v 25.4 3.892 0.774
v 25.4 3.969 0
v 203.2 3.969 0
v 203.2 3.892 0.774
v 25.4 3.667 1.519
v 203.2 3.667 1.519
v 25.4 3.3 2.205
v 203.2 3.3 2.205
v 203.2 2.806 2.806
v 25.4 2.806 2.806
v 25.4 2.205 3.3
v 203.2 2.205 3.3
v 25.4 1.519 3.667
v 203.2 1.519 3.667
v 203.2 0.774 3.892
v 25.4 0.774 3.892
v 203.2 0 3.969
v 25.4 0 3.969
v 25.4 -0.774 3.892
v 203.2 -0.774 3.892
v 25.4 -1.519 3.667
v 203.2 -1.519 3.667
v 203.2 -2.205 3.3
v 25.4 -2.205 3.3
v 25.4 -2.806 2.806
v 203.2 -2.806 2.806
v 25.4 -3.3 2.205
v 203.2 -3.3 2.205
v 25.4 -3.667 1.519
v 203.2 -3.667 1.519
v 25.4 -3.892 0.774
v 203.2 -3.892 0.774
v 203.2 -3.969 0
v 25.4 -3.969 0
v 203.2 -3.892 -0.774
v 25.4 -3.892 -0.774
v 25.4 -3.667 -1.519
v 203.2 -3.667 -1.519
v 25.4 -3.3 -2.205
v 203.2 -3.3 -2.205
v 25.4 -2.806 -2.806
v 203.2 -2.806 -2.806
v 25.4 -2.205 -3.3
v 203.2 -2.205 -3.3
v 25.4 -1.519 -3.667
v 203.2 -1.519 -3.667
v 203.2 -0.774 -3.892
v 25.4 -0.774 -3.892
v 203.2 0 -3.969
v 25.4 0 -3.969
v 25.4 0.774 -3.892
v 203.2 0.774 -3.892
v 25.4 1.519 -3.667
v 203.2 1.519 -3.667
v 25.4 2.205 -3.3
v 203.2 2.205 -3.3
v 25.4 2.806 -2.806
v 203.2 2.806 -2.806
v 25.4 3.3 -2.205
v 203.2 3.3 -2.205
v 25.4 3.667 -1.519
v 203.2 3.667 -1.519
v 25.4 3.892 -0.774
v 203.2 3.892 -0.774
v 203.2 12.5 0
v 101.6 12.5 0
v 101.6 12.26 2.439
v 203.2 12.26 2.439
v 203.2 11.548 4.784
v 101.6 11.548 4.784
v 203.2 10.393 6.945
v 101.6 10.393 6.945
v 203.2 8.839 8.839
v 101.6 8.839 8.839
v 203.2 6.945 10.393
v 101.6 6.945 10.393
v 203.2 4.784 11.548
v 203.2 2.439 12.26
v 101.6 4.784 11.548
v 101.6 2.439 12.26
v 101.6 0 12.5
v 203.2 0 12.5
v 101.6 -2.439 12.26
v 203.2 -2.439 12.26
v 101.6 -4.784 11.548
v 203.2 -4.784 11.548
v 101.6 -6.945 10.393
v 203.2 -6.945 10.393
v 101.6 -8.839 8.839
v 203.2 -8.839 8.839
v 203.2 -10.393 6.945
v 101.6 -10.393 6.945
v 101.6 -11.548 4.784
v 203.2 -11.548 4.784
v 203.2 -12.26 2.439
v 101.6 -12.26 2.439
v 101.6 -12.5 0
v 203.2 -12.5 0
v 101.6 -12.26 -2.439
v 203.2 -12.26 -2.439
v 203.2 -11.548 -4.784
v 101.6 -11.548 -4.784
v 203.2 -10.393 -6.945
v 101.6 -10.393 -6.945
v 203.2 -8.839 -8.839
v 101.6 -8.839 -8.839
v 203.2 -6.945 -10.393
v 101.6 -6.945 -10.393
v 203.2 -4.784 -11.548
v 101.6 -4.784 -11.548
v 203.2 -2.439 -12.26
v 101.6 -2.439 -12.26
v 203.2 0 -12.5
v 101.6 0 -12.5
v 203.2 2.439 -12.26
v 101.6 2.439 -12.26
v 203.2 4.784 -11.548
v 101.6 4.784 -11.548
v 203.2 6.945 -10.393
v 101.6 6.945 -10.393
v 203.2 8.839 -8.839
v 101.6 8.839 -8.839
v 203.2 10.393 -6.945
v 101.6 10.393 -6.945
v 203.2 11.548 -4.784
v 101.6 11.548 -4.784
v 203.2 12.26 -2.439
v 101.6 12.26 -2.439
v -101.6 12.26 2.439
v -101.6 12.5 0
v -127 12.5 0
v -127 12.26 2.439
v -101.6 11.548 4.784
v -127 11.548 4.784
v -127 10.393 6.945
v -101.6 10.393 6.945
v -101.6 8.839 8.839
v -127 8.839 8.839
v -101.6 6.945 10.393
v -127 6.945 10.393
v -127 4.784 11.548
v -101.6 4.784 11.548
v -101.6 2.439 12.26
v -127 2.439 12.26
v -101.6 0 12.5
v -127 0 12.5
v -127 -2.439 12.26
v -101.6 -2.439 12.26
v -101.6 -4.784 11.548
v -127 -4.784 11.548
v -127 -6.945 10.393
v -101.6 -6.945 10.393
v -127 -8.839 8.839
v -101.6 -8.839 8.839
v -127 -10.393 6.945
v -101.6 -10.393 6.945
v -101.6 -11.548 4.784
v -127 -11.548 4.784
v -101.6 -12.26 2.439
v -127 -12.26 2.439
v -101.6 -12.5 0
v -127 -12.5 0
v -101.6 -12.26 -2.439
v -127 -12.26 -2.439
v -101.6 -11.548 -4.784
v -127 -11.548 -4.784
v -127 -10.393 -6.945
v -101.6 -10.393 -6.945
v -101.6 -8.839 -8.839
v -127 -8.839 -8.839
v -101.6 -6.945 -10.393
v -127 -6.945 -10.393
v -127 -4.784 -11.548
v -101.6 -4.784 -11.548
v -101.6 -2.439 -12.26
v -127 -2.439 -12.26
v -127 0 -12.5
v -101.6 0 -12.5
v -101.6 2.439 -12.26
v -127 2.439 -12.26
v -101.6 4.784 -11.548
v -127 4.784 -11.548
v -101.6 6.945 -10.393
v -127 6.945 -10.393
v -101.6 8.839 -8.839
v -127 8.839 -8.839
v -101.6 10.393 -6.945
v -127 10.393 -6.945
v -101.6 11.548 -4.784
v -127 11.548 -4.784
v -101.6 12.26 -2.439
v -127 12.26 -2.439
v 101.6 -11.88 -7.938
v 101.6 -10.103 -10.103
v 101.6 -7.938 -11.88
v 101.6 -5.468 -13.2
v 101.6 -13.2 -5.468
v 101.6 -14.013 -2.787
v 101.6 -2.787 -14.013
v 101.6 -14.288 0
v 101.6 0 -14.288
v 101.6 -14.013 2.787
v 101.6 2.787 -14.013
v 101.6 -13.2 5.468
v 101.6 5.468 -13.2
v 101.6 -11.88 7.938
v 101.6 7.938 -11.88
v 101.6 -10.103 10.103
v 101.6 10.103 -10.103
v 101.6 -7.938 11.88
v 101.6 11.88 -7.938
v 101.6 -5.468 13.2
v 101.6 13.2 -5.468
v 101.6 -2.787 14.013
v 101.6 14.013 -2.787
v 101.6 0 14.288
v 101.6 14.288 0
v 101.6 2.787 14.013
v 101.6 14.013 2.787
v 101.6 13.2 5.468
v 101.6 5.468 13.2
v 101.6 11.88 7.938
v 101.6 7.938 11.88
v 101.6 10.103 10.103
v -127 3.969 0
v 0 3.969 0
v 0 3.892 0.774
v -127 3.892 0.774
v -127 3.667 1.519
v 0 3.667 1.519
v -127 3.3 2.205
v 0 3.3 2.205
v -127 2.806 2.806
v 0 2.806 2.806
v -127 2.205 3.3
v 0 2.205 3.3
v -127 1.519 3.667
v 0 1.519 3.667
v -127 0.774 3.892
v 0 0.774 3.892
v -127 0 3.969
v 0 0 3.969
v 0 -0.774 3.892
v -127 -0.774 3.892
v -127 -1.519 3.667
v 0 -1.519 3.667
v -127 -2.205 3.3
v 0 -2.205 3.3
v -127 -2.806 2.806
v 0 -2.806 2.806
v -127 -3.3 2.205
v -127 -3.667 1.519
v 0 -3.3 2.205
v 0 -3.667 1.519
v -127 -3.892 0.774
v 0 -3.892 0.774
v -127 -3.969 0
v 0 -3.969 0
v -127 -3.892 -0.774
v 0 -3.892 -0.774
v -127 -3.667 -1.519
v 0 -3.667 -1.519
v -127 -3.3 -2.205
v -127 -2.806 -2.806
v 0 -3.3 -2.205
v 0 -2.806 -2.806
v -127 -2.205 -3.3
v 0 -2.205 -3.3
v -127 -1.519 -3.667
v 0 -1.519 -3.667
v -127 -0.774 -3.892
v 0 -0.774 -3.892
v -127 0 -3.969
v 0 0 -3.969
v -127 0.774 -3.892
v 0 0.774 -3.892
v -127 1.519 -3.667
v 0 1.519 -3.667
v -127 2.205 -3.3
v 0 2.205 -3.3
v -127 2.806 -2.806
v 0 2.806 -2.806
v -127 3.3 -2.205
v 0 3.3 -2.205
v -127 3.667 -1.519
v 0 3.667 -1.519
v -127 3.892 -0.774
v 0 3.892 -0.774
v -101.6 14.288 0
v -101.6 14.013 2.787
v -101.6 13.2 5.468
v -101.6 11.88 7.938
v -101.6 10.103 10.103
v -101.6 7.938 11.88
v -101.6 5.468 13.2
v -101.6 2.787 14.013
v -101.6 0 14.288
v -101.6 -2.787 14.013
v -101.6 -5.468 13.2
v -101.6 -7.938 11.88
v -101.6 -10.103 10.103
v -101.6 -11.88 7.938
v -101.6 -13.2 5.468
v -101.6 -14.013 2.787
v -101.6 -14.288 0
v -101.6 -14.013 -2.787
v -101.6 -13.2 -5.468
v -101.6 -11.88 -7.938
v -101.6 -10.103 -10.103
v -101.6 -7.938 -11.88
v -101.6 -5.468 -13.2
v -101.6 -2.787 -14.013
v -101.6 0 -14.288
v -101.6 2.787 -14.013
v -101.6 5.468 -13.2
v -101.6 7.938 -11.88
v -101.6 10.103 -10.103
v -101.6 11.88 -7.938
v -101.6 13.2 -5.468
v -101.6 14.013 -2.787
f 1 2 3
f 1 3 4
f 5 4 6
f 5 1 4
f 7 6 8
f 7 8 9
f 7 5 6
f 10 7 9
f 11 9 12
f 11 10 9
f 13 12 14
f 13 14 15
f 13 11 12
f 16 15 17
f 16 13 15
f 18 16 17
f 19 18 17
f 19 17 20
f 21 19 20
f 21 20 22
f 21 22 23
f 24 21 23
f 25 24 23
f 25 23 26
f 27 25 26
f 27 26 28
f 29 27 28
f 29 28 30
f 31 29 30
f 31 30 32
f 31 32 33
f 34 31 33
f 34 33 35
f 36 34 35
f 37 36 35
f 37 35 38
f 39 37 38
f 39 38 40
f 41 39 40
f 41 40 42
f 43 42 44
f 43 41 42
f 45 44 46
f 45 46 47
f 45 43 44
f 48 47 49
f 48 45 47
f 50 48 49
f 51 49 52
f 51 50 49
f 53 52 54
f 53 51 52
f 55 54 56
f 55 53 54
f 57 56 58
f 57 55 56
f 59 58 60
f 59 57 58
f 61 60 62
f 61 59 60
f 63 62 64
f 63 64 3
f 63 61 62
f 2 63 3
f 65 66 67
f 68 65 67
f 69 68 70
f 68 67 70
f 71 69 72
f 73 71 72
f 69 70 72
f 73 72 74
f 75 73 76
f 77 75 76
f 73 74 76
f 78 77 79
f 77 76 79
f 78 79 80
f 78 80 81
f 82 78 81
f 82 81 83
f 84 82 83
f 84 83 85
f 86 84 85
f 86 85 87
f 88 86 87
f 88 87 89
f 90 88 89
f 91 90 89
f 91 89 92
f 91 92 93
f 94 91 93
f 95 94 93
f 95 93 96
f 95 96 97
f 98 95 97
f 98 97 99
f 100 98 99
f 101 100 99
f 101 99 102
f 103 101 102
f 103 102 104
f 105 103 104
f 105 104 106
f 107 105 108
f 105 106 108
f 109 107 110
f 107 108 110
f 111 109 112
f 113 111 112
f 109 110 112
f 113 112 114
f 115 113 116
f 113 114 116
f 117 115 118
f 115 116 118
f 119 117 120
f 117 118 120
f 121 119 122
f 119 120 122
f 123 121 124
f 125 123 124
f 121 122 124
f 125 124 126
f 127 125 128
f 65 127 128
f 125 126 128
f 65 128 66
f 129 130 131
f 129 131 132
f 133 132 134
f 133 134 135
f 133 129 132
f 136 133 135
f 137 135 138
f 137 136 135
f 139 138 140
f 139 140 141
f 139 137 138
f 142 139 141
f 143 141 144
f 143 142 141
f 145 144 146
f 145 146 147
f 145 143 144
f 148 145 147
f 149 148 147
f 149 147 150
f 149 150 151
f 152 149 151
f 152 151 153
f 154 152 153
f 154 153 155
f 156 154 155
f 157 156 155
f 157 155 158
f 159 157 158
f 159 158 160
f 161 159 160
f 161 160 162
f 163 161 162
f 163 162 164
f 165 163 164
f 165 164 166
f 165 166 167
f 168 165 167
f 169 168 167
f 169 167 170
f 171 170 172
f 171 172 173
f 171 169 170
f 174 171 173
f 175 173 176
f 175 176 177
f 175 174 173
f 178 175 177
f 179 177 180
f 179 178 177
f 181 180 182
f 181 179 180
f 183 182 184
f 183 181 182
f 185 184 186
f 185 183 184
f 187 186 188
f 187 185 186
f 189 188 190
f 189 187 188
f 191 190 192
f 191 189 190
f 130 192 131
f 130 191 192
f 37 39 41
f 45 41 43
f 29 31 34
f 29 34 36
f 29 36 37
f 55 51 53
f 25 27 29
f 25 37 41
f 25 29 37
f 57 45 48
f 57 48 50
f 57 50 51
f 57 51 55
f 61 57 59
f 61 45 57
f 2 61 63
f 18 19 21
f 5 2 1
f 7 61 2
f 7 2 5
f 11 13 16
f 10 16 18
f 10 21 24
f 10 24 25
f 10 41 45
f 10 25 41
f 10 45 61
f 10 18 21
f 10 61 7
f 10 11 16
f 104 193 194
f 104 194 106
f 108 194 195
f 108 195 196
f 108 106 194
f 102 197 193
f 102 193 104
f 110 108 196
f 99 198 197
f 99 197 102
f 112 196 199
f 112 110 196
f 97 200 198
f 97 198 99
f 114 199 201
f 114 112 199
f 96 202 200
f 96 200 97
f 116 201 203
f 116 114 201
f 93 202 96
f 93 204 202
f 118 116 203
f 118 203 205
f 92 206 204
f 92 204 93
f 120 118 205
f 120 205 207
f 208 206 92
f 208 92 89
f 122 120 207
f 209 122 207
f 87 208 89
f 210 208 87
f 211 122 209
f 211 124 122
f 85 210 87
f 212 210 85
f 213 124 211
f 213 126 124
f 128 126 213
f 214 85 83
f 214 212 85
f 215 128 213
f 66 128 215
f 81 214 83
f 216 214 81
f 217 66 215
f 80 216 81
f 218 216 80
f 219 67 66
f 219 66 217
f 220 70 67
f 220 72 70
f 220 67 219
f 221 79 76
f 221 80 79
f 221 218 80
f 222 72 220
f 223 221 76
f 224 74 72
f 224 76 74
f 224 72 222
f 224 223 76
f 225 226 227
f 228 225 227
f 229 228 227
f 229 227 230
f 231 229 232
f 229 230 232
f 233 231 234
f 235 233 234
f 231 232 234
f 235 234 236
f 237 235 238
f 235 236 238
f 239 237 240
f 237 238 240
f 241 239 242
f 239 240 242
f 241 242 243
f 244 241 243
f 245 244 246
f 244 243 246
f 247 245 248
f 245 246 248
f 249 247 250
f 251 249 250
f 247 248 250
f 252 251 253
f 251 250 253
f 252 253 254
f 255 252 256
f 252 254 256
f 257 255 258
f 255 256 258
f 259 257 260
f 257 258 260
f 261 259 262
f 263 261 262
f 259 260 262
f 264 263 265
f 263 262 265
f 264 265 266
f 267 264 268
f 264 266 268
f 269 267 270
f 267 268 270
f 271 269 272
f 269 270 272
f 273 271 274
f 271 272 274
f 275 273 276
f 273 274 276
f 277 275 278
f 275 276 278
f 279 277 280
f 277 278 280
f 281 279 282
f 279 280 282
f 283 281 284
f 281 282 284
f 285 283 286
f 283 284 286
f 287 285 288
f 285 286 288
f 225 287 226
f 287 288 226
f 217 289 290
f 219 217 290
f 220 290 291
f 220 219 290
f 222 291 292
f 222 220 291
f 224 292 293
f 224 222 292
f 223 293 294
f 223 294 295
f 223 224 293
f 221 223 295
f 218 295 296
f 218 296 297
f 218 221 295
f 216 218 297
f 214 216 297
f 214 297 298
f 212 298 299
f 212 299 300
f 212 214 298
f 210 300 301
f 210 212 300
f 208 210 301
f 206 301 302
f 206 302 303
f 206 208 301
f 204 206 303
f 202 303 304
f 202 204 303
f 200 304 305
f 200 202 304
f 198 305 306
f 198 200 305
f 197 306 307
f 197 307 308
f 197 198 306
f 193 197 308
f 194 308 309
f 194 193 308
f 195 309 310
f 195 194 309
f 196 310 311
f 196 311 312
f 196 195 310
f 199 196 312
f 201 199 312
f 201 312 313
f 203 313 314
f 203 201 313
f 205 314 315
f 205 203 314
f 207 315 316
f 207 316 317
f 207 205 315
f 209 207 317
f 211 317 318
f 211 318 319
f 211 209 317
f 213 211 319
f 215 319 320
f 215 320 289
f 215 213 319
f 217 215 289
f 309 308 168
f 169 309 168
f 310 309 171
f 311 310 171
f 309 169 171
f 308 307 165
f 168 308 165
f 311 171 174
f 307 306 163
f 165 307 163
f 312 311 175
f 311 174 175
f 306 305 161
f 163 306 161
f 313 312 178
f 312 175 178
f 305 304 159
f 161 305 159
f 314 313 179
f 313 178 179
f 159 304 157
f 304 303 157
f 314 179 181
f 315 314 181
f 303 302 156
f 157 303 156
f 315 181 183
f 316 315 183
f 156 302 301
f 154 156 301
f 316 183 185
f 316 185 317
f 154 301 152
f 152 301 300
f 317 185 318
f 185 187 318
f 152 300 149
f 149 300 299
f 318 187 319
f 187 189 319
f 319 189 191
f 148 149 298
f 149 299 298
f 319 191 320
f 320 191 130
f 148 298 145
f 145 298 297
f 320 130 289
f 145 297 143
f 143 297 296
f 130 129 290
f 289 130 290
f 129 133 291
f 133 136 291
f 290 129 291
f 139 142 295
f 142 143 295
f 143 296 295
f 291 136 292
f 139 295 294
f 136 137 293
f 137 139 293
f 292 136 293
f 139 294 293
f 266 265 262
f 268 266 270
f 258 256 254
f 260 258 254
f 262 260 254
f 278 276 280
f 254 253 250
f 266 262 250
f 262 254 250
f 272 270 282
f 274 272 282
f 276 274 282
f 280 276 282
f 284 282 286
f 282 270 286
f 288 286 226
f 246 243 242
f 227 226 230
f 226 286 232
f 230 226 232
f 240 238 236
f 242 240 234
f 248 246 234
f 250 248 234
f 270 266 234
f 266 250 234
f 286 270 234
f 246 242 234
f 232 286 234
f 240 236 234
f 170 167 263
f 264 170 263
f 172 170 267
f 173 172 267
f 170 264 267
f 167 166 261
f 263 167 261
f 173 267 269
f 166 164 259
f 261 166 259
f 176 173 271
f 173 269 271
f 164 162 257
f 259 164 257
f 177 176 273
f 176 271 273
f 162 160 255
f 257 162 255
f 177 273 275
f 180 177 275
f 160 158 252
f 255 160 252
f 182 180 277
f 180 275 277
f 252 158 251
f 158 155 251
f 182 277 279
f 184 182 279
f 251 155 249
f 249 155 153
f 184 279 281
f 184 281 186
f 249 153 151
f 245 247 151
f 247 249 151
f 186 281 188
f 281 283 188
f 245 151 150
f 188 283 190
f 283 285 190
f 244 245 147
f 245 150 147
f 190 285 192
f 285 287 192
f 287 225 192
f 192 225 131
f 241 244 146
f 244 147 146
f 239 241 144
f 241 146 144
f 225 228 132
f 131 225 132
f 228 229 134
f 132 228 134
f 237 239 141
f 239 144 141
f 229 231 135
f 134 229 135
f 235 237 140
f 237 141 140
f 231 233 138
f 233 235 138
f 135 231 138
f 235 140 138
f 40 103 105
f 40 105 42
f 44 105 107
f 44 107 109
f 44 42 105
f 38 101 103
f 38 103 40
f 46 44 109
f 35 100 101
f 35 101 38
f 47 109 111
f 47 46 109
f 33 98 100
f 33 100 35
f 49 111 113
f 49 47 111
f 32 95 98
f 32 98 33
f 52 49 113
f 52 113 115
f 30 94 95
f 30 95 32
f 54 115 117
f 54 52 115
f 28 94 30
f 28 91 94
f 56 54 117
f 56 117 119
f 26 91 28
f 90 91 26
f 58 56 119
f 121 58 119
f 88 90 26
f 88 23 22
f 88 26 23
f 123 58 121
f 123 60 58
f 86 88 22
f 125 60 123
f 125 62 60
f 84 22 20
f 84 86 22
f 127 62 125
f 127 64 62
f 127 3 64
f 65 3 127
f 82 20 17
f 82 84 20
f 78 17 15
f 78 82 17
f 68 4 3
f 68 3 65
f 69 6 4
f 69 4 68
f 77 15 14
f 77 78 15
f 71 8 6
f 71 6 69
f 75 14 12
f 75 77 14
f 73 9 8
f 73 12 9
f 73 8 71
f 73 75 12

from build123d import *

# Parameters (mm, degrees)
F0_R          = 14.2875
F0_R_2        = 12.5
F1_DEPTH      = 101.6
F1_DEPTH_BACK = 101.6
F0_R_3        = 3.96875
F2_DEPTH      = 203.2
F2_DEPTH_BACK = 127
F3_DEPTH      = 25.4


with BuildPart() as f1:
    # F0 (on Right) → F1 (new body, two sides)
    with BuildSketch(Plane.YZ) as f1_sk:
        Circle(F0_R)
        Circle(F0_R_2, mode=Mode.SUBTRACT)
    extrude(amount=F1_DEPTH)
    extrude(f1_sk.sketch, amount=-F1_DEPTH_BACK)

    # F0 (on Right) → F2 (join, two sides)
    with BuildSketch(Plane.YZ) as f2_sk:
        Circle(F0_R_2)
        Circle(F0_R_3, mode=Mode.SUBTRACT)
    extrude(amount=F2_DEPTH)
    extrude(f2_sk.sketch, amount=-F2_DEPTH_BACK)

    # F0 (on Right) → F3 (join)
    with BuildSketch(Plane.YZ):
        Circle(F0_R_3)
    extrude(amount=F3_DEPTH)


solid = f1.part
